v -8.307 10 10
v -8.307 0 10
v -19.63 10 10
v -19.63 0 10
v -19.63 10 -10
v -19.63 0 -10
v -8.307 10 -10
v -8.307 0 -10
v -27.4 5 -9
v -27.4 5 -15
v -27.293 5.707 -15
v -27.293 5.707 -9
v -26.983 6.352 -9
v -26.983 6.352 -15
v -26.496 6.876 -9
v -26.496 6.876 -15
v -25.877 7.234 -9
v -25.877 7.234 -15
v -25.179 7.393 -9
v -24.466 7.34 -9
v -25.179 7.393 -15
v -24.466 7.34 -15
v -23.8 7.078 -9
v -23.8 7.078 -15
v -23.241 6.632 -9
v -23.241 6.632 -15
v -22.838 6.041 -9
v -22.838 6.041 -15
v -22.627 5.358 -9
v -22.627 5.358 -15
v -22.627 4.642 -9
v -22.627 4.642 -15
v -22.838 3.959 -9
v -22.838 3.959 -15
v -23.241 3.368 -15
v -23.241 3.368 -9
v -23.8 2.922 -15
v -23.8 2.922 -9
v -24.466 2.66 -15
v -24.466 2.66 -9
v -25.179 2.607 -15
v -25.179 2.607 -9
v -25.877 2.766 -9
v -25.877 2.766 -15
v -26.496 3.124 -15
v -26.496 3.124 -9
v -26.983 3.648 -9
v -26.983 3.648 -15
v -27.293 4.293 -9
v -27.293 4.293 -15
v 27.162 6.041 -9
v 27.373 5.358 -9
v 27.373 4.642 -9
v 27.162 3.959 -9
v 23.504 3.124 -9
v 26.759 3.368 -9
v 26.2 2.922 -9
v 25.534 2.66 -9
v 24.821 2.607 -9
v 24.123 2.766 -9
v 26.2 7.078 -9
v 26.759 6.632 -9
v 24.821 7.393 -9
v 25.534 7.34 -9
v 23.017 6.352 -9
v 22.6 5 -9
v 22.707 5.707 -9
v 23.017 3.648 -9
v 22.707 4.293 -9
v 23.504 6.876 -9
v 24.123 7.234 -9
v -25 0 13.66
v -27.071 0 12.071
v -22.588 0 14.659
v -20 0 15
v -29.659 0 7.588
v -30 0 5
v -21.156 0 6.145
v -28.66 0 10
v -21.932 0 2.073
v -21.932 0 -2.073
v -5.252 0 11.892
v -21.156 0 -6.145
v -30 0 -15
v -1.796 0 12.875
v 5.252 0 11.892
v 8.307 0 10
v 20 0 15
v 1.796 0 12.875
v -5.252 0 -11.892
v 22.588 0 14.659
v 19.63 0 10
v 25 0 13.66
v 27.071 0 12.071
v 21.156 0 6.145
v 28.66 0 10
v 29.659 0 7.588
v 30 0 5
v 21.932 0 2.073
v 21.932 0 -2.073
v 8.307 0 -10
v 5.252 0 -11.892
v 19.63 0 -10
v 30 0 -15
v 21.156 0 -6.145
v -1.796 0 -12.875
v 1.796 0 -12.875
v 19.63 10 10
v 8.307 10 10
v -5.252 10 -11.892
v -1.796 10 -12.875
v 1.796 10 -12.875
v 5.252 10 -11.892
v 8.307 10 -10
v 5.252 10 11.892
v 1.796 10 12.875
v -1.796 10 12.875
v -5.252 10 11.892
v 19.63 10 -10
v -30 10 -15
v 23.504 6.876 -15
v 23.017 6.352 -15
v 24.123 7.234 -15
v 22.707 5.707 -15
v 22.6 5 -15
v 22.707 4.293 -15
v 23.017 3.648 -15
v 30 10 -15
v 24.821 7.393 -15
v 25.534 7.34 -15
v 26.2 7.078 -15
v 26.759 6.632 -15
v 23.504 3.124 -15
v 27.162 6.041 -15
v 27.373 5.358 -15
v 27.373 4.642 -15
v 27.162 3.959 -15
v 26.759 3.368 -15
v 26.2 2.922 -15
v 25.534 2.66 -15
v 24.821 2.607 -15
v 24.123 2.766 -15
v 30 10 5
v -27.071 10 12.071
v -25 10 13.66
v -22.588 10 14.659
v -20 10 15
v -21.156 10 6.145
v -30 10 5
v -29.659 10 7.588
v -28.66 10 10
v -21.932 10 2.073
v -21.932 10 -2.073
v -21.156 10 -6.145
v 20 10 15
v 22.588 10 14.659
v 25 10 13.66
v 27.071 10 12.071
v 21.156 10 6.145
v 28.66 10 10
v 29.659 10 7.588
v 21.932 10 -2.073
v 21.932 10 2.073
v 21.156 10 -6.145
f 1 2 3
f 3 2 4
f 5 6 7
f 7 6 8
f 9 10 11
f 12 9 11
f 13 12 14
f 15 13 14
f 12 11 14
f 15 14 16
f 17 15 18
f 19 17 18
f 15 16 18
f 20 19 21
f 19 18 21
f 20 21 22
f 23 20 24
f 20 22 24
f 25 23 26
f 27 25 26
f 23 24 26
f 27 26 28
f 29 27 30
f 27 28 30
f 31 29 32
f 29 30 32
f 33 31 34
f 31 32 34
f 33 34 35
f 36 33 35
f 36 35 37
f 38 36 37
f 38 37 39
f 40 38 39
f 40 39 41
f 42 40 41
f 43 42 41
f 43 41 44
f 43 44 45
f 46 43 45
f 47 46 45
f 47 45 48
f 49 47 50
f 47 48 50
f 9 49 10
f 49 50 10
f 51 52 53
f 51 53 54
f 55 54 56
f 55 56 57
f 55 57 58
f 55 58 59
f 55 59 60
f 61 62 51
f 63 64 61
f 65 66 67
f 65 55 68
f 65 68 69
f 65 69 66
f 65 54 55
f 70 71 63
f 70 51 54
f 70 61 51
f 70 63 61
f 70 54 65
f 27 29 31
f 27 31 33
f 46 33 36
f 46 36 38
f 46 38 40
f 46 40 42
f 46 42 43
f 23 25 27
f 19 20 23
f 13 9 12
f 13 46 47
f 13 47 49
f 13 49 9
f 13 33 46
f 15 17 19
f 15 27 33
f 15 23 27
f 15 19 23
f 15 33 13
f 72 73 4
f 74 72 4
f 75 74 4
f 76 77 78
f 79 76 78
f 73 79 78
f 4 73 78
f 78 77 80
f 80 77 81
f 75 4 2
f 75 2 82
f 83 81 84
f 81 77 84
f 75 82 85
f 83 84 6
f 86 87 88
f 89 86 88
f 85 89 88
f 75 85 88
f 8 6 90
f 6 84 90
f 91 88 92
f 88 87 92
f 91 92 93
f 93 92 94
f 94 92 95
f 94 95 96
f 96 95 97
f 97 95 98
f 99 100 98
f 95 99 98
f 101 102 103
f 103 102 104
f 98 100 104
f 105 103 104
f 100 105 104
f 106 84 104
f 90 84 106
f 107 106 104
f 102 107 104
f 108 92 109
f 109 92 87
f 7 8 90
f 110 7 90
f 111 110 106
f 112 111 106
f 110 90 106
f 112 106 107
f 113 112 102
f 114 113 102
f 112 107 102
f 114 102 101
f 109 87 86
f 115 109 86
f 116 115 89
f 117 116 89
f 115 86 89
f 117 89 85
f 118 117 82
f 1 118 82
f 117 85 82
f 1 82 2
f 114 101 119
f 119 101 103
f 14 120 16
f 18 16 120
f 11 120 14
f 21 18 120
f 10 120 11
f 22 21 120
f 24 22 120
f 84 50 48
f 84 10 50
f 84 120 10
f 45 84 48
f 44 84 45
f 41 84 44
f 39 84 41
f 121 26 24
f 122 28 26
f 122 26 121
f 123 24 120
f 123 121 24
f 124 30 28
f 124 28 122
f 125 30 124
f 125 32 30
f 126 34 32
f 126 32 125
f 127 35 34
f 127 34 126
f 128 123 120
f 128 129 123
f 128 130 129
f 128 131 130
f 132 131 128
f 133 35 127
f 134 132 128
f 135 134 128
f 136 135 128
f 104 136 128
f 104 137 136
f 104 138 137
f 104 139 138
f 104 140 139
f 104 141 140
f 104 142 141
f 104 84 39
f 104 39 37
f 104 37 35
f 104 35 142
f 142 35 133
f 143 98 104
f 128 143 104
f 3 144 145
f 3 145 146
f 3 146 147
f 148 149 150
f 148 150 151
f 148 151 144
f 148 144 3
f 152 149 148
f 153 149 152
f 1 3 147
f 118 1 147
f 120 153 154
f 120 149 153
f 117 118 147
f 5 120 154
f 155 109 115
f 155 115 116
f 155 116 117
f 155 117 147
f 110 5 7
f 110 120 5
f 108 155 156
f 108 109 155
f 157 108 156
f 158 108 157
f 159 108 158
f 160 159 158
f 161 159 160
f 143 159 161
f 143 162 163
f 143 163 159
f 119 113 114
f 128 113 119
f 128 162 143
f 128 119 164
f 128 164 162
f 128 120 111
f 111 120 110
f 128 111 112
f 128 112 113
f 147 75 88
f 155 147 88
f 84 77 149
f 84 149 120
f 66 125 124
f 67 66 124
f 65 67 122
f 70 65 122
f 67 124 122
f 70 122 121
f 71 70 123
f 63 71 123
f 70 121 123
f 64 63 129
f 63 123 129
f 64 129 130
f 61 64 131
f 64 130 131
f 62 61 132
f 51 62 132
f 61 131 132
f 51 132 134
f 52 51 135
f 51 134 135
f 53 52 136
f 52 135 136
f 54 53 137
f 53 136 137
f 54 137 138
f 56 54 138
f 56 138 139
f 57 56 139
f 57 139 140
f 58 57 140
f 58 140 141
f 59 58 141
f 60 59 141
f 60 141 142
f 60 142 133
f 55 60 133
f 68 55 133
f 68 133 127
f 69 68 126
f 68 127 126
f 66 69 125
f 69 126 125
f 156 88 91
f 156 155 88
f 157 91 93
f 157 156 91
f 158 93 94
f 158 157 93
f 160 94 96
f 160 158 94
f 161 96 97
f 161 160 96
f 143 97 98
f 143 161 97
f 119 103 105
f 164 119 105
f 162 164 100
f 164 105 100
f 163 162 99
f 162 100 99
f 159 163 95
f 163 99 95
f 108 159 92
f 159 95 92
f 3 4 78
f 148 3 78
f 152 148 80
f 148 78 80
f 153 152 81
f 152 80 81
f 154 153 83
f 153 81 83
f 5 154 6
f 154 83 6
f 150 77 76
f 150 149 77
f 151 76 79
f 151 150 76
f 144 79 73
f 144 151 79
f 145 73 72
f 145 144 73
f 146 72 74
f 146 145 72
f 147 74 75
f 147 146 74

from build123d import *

# Parameters (mm, degrees)
SKETCH_1_W          = 60
SKETCH_1_H          = 30
EXTRUDE_1_DEPTH     = 10
FILLET_1_R          = 10
SKETCH_2_R          = 2.4
CUT_EXTRUDE_1_DEPTH = 6


with BuildPart() as part:
    # ｽｹｯﾁ1 → ﾎﾞｽ - 押し出し1 (new body)
    with BuildSketch(Plane(origin=(0, 0, 0), x_dir=(1, 0, 0), z_dir=(0, 1, 0))):
        Rectangle(SKETCH_1_W, SKETCH_1_H)
        with BuildLine():
            Line((19.629592456, -10), (8.306623863, -10))
            ThreePointArc((8.306623863, -10), (0, -13), (-8.306623863, -10))
            Line((-8.306623863, -10), (-19.629592456, -10))
            ThreePointArc((-19.629592456, -10), (-22.03, 0), (-19.629592456, 10))
            Line((-19.629592456, 10), (-8.306623863, 10))
            ThreePointArc((-8.306623863, 10), (0, 13), (8.306623863, 10))
            Line((8.306623863, 10), (19.629592456, 10))
            ThreePointArc((19.629592456, 10), (22.03, 0), (19.629592456, -10))
        make_face(mode=Mode.SUBTRACT)
    extrude(amount=EXTRUDE_1_DEPTH)

    # ﾌｨﾚｯﾄ1
    fillet_1_edges = [part.edges().sort_by_distance(p)[0] for p in [
        (30, 5, 15),
        (-30, 5, 15),
    ]]
    fillet(fillet_1_edges, radius=FILLET_1_R)

    # ｽｹｯﾁ2 → ｶｯﾄ - 押し出し1 (cut)
    with BuildSketch(Plane(origin=(0, 0, -15), x_dir=(-1, 0, 0), z_dir=(0, 0, -1))):
        with Locations((25, 5)):
            Circle(SKETCH_2_R)
        with Locations((-25, 5)):
            Circle(SKETCH_2_R)
    extrude(amount=-CUT_EXTRUDE_1_DEPTH, mode=Mode.SUBTRACT)


solid = part.part
